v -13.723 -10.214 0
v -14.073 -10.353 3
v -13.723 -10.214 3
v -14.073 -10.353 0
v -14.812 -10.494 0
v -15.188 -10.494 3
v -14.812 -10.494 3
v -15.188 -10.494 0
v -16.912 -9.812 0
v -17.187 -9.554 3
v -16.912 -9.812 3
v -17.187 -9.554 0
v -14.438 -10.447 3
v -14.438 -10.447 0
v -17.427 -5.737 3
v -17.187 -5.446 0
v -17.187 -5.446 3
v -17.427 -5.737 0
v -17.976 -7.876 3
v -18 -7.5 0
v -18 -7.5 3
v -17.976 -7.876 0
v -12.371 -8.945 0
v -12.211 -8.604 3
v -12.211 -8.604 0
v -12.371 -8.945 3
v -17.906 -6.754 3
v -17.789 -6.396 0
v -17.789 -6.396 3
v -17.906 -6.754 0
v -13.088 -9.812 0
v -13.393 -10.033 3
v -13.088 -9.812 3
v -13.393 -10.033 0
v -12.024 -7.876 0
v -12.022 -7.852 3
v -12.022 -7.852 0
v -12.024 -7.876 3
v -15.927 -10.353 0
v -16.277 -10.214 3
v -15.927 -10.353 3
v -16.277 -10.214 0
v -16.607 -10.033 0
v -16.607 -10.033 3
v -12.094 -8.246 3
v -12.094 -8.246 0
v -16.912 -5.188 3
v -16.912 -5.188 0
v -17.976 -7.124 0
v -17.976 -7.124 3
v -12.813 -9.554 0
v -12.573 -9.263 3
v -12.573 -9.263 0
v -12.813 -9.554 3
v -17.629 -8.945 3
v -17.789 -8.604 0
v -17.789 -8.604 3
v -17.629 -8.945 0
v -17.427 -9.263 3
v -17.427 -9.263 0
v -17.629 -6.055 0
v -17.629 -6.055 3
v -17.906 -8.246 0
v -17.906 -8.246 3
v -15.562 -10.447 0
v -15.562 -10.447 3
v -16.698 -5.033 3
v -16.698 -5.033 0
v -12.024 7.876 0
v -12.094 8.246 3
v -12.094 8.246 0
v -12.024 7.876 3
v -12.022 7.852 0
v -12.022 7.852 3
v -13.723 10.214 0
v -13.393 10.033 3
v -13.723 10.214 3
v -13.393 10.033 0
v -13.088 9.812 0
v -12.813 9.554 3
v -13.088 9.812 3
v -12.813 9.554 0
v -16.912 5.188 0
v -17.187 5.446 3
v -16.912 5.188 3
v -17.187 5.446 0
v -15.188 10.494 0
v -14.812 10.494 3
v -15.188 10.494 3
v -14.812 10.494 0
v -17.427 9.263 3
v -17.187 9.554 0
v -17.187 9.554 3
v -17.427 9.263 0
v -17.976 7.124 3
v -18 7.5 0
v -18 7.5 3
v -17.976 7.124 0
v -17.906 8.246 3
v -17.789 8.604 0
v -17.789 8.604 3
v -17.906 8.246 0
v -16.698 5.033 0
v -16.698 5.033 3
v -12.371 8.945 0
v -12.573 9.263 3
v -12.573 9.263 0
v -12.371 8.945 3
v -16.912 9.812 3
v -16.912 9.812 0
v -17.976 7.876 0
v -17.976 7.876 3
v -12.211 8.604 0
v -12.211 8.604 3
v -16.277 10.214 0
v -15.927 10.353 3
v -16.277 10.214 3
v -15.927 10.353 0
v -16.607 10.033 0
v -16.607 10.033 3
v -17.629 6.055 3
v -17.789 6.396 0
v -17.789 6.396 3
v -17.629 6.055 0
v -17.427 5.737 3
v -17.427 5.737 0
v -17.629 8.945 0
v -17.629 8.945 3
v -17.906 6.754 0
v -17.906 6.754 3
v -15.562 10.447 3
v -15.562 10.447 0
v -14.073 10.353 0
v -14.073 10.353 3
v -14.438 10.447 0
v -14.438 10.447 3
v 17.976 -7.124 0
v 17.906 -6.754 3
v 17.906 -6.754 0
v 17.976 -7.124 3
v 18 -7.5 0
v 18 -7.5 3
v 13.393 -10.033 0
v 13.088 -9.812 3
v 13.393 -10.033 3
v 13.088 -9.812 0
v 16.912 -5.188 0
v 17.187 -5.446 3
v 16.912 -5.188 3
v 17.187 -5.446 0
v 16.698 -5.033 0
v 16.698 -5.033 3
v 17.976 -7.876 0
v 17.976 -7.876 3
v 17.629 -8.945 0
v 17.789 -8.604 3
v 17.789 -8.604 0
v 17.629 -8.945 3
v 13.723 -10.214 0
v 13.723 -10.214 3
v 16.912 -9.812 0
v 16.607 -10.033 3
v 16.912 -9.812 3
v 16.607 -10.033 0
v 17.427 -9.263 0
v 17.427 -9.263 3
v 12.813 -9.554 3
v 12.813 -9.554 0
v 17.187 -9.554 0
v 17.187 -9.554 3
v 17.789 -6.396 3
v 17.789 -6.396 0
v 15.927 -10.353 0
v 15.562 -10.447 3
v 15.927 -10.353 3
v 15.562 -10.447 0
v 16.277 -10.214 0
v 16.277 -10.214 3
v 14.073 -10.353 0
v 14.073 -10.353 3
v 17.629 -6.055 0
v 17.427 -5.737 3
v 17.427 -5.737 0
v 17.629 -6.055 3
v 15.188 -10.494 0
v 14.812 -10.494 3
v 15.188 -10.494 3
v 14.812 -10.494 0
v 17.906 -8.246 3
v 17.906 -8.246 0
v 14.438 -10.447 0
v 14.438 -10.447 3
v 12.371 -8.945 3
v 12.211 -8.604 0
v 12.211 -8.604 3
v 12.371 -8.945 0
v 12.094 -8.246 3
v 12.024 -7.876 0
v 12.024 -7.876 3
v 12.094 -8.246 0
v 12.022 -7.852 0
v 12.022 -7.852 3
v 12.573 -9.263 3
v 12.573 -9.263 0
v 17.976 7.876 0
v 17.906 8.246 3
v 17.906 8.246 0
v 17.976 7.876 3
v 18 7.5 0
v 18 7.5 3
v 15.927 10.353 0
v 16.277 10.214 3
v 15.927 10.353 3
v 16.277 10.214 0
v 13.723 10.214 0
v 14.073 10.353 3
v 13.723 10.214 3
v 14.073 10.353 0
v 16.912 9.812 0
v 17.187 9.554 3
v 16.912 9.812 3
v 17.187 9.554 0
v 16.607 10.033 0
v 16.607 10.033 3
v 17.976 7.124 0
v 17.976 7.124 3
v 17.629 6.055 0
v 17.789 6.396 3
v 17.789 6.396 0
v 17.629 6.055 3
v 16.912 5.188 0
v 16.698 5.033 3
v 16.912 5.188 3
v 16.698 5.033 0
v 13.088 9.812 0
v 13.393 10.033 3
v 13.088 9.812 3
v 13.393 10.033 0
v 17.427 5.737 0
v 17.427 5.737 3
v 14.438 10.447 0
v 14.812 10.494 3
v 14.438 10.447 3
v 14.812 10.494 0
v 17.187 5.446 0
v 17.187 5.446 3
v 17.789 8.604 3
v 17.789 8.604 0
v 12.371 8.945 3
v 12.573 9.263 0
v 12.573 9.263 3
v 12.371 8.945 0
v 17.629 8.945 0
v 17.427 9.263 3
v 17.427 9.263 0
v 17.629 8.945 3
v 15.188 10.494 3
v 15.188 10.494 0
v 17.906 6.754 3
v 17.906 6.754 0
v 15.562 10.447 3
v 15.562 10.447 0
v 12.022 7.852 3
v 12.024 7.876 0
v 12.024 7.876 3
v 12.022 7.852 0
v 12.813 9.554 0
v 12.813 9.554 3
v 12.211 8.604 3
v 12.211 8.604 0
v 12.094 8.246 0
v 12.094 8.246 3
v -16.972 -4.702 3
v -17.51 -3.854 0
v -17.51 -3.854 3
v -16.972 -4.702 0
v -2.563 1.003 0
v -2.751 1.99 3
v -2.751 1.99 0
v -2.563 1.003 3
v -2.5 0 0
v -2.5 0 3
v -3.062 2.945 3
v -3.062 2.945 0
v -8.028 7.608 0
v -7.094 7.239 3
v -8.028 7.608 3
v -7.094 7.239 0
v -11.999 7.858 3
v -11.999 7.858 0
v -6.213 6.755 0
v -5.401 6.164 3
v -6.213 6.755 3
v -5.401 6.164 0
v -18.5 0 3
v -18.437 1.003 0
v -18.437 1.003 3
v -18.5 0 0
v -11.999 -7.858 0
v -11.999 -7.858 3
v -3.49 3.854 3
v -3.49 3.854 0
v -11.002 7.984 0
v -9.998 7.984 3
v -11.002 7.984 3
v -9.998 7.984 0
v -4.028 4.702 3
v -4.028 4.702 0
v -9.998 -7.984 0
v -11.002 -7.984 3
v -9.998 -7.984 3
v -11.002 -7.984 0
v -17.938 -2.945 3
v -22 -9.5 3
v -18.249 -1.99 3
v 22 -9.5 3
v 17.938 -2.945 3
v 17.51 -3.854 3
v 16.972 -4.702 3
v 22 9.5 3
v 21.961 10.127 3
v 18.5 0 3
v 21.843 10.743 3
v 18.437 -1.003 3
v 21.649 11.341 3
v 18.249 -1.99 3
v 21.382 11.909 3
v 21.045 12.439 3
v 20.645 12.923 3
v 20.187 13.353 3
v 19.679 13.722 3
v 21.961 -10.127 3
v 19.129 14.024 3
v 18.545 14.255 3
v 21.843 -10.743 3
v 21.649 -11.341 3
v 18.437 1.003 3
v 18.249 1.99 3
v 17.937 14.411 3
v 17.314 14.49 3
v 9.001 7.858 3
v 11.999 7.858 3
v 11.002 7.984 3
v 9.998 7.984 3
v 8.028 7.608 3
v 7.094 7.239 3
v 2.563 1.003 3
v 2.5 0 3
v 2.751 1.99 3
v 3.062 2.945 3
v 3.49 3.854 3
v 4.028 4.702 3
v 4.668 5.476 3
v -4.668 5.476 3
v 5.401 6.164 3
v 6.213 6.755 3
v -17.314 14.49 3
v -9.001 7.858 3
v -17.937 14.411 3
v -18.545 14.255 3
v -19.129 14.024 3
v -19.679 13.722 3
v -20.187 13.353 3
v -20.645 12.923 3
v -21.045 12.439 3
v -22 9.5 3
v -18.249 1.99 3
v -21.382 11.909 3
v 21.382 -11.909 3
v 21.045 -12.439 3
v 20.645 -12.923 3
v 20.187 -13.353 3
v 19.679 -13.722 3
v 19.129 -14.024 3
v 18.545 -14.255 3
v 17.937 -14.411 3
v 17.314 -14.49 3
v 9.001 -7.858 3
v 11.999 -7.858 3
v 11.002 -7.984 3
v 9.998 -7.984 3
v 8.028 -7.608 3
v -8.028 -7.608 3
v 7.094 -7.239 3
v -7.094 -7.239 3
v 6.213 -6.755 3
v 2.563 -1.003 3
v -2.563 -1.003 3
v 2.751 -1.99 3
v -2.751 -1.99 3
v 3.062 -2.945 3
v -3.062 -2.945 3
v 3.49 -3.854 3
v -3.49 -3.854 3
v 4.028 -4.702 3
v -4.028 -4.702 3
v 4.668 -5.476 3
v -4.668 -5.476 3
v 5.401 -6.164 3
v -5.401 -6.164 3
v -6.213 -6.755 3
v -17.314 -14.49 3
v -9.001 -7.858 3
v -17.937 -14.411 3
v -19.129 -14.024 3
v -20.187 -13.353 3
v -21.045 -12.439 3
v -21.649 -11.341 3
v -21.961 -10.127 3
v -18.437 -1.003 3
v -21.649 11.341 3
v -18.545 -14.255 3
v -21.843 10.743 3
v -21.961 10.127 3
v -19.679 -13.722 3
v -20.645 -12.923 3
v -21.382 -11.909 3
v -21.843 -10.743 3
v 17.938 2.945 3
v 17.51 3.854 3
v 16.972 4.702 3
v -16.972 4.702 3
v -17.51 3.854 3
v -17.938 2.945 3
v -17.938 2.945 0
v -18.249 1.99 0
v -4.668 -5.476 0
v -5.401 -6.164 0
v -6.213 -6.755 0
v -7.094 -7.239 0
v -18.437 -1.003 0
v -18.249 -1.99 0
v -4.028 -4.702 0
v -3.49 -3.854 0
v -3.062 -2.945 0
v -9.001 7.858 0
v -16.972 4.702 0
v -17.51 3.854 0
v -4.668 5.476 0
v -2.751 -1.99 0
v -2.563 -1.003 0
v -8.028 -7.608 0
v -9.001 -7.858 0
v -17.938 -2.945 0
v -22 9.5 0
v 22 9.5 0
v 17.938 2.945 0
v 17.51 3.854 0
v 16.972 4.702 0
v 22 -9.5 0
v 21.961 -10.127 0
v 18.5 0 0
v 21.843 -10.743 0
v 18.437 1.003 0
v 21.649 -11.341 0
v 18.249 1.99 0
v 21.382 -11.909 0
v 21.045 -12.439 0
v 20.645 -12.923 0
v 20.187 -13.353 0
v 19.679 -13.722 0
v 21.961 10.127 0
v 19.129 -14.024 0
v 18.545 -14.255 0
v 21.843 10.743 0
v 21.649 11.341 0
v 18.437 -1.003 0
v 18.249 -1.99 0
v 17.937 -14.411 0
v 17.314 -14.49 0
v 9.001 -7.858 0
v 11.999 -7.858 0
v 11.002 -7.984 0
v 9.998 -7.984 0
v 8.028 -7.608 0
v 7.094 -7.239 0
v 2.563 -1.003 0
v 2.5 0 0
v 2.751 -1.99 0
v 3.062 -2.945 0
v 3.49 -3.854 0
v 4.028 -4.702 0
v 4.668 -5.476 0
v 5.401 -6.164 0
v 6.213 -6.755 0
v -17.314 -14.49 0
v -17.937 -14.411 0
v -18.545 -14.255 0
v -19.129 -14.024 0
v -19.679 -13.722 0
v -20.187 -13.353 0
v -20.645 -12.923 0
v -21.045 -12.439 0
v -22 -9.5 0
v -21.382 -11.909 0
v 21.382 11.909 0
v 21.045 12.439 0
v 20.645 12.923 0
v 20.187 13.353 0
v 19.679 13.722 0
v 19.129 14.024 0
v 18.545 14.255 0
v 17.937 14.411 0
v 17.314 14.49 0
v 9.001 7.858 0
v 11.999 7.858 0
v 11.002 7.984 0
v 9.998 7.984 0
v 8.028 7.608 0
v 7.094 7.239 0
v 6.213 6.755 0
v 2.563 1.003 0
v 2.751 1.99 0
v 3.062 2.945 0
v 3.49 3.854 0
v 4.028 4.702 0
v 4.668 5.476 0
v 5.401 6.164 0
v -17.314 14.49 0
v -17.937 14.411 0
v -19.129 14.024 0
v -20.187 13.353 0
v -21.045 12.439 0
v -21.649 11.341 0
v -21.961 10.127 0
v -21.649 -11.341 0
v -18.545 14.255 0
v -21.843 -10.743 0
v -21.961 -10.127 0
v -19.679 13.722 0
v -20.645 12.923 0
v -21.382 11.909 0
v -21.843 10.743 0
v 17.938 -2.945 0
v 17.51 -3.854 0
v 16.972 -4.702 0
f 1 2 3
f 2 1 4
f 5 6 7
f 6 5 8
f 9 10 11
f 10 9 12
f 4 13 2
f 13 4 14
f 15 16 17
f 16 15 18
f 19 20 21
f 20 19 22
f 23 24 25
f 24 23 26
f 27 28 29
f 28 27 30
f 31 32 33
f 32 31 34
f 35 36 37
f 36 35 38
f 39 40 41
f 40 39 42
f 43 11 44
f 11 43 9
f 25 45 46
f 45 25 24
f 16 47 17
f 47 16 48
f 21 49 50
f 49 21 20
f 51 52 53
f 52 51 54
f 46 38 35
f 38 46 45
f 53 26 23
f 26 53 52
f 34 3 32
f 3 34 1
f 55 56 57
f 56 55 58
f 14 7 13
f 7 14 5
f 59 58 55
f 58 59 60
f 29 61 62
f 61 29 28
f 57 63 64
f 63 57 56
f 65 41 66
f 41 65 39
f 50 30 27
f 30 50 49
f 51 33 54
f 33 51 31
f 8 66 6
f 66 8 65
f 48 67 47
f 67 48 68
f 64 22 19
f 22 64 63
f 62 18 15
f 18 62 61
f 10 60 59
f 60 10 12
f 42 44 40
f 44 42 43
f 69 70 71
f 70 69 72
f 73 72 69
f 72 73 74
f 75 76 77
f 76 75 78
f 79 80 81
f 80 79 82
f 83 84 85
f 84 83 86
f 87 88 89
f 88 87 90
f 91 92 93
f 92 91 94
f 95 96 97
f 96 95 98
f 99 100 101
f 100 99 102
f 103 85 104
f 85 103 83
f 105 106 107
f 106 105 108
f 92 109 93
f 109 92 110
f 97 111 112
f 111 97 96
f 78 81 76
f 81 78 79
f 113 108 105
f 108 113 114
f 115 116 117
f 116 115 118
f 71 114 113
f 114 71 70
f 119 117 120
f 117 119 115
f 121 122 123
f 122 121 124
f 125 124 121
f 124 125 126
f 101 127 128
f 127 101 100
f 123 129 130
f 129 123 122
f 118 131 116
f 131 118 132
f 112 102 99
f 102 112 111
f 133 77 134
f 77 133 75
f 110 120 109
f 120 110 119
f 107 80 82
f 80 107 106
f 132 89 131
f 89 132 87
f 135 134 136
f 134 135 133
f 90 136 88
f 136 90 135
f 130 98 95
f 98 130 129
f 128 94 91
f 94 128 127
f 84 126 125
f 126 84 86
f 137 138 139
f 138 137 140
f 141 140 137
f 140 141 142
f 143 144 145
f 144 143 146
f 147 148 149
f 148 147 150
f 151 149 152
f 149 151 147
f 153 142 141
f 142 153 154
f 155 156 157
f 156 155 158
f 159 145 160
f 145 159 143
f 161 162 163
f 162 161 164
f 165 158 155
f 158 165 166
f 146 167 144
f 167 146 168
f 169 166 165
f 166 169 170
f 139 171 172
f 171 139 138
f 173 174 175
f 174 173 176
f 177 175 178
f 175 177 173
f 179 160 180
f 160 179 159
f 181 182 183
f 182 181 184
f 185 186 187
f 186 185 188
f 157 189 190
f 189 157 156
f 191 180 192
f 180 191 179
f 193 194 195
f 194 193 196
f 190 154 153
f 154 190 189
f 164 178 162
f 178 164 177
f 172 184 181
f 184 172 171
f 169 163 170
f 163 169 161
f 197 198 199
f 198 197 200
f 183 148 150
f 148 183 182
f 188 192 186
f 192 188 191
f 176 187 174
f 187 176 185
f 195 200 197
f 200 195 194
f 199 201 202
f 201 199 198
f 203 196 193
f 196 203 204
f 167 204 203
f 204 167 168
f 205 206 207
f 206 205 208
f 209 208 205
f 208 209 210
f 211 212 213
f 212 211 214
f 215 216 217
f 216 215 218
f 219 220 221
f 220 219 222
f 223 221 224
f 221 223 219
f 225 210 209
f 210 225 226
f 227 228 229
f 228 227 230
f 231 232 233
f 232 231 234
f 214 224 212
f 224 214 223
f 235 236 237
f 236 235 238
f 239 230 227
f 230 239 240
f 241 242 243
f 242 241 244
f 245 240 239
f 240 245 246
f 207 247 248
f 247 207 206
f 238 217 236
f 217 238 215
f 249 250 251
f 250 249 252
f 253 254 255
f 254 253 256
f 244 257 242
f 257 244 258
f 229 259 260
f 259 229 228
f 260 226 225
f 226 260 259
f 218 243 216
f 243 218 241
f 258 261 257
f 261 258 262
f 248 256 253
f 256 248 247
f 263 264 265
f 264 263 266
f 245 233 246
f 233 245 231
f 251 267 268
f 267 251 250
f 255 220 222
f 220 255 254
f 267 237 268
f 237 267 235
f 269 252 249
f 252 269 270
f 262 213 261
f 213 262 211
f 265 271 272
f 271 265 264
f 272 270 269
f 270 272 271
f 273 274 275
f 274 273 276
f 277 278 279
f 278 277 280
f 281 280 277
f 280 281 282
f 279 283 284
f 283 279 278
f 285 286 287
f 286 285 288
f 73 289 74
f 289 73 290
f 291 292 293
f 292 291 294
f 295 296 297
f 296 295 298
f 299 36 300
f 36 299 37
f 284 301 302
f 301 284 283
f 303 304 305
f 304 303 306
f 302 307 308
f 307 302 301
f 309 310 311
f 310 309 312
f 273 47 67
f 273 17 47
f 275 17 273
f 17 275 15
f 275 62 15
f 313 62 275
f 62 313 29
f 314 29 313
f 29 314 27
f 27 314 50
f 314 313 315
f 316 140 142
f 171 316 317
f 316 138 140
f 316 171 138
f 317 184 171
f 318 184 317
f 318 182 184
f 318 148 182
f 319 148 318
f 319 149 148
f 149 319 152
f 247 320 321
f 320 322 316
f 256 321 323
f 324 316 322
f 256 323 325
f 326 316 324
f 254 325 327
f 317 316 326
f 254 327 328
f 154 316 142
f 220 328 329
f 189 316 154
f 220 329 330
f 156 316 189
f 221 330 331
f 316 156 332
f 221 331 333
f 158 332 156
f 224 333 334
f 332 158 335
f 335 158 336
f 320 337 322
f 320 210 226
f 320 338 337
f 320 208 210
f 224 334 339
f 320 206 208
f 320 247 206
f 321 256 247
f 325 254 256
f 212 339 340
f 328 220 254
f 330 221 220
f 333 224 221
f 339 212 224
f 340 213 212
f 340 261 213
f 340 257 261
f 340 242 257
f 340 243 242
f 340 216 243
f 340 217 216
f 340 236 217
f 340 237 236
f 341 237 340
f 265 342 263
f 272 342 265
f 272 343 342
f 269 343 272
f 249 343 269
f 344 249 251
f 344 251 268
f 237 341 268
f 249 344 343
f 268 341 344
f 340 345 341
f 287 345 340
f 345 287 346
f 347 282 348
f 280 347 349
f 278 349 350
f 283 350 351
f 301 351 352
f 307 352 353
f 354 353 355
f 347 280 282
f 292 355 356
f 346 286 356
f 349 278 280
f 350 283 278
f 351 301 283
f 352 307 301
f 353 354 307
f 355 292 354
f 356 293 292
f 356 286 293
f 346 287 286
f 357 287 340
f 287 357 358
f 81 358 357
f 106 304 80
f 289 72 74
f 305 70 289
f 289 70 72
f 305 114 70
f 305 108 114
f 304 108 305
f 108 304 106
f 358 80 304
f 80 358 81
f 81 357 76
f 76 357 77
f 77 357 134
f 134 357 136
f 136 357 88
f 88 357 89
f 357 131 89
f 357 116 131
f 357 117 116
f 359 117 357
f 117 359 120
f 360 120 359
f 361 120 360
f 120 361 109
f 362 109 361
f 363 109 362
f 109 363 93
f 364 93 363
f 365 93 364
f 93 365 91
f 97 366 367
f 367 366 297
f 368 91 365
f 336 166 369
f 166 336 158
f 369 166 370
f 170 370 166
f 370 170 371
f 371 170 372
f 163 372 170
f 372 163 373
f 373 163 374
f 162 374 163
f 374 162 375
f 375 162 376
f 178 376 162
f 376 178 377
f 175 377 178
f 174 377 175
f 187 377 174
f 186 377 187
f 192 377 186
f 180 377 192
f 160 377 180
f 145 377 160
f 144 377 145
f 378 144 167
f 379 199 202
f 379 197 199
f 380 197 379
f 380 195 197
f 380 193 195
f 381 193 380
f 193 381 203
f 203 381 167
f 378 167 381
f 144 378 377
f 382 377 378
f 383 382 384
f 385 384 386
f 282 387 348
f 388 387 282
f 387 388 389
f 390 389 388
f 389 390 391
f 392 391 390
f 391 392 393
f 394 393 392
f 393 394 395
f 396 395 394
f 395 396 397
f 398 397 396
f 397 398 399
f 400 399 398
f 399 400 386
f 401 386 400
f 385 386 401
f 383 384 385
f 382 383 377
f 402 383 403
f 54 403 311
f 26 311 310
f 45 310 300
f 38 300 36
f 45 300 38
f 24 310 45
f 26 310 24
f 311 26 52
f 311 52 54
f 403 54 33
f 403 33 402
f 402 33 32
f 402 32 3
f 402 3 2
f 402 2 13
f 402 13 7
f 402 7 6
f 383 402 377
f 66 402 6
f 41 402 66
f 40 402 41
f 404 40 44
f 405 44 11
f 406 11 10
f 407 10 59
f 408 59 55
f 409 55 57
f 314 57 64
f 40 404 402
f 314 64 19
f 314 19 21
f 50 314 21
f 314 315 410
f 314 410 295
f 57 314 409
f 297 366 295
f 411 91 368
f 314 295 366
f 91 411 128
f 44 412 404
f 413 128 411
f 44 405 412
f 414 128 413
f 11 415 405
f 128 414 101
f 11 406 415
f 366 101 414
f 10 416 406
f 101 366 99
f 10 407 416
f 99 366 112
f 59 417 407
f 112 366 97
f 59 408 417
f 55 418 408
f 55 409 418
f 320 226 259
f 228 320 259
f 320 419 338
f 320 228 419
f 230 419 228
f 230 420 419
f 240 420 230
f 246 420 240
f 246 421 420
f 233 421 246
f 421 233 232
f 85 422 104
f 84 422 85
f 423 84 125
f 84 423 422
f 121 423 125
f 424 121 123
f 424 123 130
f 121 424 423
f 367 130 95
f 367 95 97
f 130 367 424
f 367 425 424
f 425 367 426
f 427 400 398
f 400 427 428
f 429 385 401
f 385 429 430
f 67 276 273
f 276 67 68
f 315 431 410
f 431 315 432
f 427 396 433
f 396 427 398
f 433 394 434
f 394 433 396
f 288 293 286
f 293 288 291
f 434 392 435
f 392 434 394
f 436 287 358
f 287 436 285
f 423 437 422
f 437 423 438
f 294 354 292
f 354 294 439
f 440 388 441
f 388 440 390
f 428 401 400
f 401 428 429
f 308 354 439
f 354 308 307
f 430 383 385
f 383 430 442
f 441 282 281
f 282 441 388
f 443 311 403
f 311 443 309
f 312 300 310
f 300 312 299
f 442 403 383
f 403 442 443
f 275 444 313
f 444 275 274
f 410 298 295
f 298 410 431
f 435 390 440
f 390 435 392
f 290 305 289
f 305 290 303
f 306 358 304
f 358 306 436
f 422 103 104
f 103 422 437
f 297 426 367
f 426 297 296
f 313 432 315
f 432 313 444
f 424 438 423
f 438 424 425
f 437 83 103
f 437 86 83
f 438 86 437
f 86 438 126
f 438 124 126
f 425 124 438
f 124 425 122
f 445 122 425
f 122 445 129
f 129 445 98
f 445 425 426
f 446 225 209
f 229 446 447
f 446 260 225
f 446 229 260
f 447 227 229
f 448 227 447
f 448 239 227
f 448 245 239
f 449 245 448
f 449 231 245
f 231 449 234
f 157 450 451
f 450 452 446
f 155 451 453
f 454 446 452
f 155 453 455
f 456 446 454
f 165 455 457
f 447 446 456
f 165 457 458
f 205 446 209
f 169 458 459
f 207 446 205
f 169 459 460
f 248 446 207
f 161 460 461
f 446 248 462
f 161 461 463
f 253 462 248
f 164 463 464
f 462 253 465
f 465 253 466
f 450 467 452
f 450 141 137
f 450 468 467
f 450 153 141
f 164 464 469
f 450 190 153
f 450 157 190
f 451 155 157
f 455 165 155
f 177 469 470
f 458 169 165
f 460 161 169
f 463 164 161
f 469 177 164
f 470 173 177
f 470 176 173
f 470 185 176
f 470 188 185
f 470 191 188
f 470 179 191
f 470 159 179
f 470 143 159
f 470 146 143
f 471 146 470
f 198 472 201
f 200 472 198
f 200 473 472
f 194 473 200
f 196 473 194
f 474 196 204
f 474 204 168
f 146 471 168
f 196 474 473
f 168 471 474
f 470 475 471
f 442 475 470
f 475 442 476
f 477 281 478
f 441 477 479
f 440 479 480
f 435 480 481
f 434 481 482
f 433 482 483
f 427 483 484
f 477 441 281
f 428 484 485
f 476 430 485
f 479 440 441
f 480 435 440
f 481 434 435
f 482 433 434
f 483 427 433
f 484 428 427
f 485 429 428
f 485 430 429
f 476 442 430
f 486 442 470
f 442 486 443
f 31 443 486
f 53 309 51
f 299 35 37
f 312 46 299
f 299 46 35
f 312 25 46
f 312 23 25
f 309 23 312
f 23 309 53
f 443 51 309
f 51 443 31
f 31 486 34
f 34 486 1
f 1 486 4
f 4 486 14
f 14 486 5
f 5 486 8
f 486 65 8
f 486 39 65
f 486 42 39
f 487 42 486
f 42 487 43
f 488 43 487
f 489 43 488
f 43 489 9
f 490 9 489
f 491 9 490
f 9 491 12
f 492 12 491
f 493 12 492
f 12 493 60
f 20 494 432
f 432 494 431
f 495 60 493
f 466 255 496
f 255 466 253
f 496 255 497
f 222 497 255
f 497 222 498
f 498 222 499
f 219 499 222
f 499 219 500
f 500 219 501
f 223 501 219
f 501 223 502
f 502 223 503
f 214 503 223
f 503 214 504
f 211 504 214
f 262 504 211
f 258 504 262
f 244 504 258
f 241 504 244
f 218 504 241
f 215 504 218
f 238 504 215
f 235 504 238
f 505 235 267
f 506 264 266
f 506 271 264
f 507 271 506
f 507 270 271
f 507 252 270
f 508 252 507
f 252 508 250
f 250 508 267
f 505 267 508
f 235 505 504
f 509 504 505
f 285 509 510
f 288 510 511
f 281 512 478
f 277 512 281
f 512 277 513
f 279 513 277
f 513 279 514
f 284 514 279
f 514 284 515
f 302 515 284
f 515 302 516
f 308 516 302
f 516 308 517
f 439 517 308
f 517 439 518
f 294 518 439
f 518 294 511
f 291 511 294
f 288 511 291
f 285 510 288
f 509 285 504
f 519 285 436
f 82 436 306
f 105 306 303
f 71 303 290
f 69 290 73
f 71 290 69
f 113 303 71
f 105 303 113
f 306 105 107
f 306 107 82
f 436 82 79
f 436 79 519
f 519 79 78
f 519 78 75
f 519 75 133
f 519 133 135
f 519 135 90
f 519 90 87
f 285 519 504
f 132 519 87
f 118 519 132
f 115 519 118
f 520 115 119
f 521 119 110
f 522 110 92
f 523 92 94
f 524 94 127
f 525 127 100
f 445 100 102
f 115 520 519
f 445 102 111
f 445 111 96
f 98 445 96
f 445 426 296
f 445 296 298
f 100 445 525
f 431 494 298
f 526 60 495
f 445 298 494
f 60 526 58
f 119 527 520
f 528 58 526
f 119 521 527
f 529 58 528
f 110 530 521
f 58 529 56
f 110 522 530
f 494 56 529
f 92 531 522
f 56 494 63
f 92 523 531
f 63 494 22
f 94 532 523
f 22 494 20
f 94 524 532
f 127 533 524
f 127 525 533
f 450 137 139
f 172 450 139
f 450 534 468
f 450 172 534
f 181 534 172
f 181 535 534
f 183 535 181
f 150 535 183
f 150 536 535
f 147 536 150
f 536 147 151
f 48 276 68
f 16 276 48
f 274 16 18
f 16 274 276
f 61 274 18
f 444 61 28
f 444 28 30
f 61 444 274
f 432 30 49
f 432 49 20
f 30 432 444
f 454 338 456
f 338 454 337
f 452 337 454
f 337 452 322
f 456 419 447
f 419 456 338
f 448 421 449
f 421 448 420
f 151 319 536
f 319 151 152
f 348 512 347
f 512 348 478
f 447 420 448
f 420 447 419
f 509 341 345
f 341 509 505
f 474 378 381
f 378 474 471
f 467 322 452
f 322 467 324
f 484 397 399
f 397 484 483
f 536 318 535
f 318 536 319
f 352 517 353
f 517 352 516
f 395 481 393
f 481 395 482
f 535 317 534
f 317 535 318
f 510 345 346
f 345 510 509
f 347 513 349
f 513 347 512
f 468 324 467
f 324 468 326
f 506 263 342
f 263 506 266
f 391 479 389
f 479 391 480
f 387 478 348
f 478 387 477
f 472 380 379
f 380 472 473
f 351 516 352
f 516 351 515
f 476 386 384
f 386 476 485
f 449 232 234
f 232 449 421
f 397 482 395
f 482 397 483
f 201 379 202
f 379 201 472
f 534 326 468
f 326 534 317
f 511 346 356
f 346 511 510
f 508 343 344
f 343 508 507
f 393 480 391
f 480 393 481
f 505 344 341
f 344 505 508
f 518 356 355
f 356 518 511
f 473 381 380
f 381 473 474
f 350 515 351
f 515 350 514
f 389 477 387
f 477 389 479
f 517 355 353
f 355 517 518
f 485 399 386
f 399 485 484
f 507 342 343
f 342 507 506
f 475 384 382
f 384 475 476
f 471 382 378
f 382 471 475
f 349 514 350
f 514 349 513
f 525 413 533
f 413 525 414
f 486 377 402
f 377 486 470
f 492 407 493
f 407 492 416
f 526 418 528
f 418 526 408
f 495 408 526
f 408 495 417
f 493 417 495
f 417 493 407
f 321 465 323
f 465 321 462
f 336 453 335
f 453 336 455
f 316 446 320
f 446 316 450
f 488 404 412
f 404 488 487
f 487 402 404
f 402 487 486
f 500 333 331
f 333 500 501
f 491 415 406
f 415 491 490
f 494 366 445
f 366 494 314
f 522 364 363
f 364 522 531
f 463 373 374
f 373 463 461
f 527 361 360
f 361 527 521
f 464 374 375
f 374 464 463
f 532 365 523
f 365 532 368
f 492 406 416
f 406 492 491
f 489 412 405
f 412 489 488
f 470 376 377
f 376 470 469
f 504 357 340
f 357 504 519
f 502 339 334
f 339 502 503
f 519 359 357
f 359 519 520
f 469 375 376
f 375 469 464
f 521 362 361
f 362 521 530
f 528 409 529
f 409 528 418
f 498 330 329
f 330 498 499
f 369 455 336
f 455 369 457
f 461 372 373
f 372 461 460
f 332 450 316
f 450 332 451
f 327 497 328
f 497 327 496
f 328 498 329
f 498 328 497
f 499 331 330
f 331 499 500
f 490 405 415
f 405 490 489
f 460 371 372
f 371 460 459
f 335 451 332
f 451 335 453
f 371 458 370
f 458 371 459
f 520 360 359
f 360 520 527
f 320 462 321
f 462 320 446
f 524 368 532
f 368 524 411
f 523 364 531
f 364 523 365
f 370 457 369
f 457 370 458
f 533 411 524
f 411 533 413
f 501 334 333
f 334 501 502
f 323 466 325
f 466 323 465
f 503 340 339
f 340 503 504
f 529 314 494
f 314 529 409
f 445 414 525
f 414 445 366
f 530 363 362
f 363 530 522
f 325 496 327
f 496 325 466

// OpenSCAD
$fn = 50;


difference() {
	union() {
		hull() {
			translate(v = [-17.0000000000, 9.5000000000, 0]) {
				cylinder(h = 3, r = 5);
			}
			translate(v = [17.0000000000, 9.5000000000, 0]) {
				cylinder(h = 3, r = 5);
			}
			translate(v = [-17.0000000000, -9.5000000000, 0]) {
				cylinder(h = 3, r = 5);
			}
			translate(v = [17.0000000000, -9.5000000000, 0]) {
				cylinder(h = 3, r = 5);
			}
		}
	}
	union() {
		#translate(v = [-15.0000000000, -7.5000000000, -100.0000000000]) {
			cylinder(h = 200, r = 3.0000000000);
		}
		#translate(v = [-15.0000000000, 7.5000000000, -100.0000000000]) {
			cylinder(h = 200, r = 3.0000000000);
		}
		#translate(v = [15.0000000000, -7.5000000000, -100.0000000000]) {
			cylinder(h = 200, r = 3.0000000000);
		}
		#translate(v = [15.0000000000, 7.5000000000, -100.0000000000]) {
			cylinder(h = 200, r = 3.0000000000);
		}
		#translate(v = [-10.5000000000, 0, 0]) {
			cylinder(h = 3, r = 8.0000000000);
		}
		#translate(v = [10.5000000000, 0, 0]) {
			cylinder(h = 3, r = 8.0000000000);
		}
	}
}
